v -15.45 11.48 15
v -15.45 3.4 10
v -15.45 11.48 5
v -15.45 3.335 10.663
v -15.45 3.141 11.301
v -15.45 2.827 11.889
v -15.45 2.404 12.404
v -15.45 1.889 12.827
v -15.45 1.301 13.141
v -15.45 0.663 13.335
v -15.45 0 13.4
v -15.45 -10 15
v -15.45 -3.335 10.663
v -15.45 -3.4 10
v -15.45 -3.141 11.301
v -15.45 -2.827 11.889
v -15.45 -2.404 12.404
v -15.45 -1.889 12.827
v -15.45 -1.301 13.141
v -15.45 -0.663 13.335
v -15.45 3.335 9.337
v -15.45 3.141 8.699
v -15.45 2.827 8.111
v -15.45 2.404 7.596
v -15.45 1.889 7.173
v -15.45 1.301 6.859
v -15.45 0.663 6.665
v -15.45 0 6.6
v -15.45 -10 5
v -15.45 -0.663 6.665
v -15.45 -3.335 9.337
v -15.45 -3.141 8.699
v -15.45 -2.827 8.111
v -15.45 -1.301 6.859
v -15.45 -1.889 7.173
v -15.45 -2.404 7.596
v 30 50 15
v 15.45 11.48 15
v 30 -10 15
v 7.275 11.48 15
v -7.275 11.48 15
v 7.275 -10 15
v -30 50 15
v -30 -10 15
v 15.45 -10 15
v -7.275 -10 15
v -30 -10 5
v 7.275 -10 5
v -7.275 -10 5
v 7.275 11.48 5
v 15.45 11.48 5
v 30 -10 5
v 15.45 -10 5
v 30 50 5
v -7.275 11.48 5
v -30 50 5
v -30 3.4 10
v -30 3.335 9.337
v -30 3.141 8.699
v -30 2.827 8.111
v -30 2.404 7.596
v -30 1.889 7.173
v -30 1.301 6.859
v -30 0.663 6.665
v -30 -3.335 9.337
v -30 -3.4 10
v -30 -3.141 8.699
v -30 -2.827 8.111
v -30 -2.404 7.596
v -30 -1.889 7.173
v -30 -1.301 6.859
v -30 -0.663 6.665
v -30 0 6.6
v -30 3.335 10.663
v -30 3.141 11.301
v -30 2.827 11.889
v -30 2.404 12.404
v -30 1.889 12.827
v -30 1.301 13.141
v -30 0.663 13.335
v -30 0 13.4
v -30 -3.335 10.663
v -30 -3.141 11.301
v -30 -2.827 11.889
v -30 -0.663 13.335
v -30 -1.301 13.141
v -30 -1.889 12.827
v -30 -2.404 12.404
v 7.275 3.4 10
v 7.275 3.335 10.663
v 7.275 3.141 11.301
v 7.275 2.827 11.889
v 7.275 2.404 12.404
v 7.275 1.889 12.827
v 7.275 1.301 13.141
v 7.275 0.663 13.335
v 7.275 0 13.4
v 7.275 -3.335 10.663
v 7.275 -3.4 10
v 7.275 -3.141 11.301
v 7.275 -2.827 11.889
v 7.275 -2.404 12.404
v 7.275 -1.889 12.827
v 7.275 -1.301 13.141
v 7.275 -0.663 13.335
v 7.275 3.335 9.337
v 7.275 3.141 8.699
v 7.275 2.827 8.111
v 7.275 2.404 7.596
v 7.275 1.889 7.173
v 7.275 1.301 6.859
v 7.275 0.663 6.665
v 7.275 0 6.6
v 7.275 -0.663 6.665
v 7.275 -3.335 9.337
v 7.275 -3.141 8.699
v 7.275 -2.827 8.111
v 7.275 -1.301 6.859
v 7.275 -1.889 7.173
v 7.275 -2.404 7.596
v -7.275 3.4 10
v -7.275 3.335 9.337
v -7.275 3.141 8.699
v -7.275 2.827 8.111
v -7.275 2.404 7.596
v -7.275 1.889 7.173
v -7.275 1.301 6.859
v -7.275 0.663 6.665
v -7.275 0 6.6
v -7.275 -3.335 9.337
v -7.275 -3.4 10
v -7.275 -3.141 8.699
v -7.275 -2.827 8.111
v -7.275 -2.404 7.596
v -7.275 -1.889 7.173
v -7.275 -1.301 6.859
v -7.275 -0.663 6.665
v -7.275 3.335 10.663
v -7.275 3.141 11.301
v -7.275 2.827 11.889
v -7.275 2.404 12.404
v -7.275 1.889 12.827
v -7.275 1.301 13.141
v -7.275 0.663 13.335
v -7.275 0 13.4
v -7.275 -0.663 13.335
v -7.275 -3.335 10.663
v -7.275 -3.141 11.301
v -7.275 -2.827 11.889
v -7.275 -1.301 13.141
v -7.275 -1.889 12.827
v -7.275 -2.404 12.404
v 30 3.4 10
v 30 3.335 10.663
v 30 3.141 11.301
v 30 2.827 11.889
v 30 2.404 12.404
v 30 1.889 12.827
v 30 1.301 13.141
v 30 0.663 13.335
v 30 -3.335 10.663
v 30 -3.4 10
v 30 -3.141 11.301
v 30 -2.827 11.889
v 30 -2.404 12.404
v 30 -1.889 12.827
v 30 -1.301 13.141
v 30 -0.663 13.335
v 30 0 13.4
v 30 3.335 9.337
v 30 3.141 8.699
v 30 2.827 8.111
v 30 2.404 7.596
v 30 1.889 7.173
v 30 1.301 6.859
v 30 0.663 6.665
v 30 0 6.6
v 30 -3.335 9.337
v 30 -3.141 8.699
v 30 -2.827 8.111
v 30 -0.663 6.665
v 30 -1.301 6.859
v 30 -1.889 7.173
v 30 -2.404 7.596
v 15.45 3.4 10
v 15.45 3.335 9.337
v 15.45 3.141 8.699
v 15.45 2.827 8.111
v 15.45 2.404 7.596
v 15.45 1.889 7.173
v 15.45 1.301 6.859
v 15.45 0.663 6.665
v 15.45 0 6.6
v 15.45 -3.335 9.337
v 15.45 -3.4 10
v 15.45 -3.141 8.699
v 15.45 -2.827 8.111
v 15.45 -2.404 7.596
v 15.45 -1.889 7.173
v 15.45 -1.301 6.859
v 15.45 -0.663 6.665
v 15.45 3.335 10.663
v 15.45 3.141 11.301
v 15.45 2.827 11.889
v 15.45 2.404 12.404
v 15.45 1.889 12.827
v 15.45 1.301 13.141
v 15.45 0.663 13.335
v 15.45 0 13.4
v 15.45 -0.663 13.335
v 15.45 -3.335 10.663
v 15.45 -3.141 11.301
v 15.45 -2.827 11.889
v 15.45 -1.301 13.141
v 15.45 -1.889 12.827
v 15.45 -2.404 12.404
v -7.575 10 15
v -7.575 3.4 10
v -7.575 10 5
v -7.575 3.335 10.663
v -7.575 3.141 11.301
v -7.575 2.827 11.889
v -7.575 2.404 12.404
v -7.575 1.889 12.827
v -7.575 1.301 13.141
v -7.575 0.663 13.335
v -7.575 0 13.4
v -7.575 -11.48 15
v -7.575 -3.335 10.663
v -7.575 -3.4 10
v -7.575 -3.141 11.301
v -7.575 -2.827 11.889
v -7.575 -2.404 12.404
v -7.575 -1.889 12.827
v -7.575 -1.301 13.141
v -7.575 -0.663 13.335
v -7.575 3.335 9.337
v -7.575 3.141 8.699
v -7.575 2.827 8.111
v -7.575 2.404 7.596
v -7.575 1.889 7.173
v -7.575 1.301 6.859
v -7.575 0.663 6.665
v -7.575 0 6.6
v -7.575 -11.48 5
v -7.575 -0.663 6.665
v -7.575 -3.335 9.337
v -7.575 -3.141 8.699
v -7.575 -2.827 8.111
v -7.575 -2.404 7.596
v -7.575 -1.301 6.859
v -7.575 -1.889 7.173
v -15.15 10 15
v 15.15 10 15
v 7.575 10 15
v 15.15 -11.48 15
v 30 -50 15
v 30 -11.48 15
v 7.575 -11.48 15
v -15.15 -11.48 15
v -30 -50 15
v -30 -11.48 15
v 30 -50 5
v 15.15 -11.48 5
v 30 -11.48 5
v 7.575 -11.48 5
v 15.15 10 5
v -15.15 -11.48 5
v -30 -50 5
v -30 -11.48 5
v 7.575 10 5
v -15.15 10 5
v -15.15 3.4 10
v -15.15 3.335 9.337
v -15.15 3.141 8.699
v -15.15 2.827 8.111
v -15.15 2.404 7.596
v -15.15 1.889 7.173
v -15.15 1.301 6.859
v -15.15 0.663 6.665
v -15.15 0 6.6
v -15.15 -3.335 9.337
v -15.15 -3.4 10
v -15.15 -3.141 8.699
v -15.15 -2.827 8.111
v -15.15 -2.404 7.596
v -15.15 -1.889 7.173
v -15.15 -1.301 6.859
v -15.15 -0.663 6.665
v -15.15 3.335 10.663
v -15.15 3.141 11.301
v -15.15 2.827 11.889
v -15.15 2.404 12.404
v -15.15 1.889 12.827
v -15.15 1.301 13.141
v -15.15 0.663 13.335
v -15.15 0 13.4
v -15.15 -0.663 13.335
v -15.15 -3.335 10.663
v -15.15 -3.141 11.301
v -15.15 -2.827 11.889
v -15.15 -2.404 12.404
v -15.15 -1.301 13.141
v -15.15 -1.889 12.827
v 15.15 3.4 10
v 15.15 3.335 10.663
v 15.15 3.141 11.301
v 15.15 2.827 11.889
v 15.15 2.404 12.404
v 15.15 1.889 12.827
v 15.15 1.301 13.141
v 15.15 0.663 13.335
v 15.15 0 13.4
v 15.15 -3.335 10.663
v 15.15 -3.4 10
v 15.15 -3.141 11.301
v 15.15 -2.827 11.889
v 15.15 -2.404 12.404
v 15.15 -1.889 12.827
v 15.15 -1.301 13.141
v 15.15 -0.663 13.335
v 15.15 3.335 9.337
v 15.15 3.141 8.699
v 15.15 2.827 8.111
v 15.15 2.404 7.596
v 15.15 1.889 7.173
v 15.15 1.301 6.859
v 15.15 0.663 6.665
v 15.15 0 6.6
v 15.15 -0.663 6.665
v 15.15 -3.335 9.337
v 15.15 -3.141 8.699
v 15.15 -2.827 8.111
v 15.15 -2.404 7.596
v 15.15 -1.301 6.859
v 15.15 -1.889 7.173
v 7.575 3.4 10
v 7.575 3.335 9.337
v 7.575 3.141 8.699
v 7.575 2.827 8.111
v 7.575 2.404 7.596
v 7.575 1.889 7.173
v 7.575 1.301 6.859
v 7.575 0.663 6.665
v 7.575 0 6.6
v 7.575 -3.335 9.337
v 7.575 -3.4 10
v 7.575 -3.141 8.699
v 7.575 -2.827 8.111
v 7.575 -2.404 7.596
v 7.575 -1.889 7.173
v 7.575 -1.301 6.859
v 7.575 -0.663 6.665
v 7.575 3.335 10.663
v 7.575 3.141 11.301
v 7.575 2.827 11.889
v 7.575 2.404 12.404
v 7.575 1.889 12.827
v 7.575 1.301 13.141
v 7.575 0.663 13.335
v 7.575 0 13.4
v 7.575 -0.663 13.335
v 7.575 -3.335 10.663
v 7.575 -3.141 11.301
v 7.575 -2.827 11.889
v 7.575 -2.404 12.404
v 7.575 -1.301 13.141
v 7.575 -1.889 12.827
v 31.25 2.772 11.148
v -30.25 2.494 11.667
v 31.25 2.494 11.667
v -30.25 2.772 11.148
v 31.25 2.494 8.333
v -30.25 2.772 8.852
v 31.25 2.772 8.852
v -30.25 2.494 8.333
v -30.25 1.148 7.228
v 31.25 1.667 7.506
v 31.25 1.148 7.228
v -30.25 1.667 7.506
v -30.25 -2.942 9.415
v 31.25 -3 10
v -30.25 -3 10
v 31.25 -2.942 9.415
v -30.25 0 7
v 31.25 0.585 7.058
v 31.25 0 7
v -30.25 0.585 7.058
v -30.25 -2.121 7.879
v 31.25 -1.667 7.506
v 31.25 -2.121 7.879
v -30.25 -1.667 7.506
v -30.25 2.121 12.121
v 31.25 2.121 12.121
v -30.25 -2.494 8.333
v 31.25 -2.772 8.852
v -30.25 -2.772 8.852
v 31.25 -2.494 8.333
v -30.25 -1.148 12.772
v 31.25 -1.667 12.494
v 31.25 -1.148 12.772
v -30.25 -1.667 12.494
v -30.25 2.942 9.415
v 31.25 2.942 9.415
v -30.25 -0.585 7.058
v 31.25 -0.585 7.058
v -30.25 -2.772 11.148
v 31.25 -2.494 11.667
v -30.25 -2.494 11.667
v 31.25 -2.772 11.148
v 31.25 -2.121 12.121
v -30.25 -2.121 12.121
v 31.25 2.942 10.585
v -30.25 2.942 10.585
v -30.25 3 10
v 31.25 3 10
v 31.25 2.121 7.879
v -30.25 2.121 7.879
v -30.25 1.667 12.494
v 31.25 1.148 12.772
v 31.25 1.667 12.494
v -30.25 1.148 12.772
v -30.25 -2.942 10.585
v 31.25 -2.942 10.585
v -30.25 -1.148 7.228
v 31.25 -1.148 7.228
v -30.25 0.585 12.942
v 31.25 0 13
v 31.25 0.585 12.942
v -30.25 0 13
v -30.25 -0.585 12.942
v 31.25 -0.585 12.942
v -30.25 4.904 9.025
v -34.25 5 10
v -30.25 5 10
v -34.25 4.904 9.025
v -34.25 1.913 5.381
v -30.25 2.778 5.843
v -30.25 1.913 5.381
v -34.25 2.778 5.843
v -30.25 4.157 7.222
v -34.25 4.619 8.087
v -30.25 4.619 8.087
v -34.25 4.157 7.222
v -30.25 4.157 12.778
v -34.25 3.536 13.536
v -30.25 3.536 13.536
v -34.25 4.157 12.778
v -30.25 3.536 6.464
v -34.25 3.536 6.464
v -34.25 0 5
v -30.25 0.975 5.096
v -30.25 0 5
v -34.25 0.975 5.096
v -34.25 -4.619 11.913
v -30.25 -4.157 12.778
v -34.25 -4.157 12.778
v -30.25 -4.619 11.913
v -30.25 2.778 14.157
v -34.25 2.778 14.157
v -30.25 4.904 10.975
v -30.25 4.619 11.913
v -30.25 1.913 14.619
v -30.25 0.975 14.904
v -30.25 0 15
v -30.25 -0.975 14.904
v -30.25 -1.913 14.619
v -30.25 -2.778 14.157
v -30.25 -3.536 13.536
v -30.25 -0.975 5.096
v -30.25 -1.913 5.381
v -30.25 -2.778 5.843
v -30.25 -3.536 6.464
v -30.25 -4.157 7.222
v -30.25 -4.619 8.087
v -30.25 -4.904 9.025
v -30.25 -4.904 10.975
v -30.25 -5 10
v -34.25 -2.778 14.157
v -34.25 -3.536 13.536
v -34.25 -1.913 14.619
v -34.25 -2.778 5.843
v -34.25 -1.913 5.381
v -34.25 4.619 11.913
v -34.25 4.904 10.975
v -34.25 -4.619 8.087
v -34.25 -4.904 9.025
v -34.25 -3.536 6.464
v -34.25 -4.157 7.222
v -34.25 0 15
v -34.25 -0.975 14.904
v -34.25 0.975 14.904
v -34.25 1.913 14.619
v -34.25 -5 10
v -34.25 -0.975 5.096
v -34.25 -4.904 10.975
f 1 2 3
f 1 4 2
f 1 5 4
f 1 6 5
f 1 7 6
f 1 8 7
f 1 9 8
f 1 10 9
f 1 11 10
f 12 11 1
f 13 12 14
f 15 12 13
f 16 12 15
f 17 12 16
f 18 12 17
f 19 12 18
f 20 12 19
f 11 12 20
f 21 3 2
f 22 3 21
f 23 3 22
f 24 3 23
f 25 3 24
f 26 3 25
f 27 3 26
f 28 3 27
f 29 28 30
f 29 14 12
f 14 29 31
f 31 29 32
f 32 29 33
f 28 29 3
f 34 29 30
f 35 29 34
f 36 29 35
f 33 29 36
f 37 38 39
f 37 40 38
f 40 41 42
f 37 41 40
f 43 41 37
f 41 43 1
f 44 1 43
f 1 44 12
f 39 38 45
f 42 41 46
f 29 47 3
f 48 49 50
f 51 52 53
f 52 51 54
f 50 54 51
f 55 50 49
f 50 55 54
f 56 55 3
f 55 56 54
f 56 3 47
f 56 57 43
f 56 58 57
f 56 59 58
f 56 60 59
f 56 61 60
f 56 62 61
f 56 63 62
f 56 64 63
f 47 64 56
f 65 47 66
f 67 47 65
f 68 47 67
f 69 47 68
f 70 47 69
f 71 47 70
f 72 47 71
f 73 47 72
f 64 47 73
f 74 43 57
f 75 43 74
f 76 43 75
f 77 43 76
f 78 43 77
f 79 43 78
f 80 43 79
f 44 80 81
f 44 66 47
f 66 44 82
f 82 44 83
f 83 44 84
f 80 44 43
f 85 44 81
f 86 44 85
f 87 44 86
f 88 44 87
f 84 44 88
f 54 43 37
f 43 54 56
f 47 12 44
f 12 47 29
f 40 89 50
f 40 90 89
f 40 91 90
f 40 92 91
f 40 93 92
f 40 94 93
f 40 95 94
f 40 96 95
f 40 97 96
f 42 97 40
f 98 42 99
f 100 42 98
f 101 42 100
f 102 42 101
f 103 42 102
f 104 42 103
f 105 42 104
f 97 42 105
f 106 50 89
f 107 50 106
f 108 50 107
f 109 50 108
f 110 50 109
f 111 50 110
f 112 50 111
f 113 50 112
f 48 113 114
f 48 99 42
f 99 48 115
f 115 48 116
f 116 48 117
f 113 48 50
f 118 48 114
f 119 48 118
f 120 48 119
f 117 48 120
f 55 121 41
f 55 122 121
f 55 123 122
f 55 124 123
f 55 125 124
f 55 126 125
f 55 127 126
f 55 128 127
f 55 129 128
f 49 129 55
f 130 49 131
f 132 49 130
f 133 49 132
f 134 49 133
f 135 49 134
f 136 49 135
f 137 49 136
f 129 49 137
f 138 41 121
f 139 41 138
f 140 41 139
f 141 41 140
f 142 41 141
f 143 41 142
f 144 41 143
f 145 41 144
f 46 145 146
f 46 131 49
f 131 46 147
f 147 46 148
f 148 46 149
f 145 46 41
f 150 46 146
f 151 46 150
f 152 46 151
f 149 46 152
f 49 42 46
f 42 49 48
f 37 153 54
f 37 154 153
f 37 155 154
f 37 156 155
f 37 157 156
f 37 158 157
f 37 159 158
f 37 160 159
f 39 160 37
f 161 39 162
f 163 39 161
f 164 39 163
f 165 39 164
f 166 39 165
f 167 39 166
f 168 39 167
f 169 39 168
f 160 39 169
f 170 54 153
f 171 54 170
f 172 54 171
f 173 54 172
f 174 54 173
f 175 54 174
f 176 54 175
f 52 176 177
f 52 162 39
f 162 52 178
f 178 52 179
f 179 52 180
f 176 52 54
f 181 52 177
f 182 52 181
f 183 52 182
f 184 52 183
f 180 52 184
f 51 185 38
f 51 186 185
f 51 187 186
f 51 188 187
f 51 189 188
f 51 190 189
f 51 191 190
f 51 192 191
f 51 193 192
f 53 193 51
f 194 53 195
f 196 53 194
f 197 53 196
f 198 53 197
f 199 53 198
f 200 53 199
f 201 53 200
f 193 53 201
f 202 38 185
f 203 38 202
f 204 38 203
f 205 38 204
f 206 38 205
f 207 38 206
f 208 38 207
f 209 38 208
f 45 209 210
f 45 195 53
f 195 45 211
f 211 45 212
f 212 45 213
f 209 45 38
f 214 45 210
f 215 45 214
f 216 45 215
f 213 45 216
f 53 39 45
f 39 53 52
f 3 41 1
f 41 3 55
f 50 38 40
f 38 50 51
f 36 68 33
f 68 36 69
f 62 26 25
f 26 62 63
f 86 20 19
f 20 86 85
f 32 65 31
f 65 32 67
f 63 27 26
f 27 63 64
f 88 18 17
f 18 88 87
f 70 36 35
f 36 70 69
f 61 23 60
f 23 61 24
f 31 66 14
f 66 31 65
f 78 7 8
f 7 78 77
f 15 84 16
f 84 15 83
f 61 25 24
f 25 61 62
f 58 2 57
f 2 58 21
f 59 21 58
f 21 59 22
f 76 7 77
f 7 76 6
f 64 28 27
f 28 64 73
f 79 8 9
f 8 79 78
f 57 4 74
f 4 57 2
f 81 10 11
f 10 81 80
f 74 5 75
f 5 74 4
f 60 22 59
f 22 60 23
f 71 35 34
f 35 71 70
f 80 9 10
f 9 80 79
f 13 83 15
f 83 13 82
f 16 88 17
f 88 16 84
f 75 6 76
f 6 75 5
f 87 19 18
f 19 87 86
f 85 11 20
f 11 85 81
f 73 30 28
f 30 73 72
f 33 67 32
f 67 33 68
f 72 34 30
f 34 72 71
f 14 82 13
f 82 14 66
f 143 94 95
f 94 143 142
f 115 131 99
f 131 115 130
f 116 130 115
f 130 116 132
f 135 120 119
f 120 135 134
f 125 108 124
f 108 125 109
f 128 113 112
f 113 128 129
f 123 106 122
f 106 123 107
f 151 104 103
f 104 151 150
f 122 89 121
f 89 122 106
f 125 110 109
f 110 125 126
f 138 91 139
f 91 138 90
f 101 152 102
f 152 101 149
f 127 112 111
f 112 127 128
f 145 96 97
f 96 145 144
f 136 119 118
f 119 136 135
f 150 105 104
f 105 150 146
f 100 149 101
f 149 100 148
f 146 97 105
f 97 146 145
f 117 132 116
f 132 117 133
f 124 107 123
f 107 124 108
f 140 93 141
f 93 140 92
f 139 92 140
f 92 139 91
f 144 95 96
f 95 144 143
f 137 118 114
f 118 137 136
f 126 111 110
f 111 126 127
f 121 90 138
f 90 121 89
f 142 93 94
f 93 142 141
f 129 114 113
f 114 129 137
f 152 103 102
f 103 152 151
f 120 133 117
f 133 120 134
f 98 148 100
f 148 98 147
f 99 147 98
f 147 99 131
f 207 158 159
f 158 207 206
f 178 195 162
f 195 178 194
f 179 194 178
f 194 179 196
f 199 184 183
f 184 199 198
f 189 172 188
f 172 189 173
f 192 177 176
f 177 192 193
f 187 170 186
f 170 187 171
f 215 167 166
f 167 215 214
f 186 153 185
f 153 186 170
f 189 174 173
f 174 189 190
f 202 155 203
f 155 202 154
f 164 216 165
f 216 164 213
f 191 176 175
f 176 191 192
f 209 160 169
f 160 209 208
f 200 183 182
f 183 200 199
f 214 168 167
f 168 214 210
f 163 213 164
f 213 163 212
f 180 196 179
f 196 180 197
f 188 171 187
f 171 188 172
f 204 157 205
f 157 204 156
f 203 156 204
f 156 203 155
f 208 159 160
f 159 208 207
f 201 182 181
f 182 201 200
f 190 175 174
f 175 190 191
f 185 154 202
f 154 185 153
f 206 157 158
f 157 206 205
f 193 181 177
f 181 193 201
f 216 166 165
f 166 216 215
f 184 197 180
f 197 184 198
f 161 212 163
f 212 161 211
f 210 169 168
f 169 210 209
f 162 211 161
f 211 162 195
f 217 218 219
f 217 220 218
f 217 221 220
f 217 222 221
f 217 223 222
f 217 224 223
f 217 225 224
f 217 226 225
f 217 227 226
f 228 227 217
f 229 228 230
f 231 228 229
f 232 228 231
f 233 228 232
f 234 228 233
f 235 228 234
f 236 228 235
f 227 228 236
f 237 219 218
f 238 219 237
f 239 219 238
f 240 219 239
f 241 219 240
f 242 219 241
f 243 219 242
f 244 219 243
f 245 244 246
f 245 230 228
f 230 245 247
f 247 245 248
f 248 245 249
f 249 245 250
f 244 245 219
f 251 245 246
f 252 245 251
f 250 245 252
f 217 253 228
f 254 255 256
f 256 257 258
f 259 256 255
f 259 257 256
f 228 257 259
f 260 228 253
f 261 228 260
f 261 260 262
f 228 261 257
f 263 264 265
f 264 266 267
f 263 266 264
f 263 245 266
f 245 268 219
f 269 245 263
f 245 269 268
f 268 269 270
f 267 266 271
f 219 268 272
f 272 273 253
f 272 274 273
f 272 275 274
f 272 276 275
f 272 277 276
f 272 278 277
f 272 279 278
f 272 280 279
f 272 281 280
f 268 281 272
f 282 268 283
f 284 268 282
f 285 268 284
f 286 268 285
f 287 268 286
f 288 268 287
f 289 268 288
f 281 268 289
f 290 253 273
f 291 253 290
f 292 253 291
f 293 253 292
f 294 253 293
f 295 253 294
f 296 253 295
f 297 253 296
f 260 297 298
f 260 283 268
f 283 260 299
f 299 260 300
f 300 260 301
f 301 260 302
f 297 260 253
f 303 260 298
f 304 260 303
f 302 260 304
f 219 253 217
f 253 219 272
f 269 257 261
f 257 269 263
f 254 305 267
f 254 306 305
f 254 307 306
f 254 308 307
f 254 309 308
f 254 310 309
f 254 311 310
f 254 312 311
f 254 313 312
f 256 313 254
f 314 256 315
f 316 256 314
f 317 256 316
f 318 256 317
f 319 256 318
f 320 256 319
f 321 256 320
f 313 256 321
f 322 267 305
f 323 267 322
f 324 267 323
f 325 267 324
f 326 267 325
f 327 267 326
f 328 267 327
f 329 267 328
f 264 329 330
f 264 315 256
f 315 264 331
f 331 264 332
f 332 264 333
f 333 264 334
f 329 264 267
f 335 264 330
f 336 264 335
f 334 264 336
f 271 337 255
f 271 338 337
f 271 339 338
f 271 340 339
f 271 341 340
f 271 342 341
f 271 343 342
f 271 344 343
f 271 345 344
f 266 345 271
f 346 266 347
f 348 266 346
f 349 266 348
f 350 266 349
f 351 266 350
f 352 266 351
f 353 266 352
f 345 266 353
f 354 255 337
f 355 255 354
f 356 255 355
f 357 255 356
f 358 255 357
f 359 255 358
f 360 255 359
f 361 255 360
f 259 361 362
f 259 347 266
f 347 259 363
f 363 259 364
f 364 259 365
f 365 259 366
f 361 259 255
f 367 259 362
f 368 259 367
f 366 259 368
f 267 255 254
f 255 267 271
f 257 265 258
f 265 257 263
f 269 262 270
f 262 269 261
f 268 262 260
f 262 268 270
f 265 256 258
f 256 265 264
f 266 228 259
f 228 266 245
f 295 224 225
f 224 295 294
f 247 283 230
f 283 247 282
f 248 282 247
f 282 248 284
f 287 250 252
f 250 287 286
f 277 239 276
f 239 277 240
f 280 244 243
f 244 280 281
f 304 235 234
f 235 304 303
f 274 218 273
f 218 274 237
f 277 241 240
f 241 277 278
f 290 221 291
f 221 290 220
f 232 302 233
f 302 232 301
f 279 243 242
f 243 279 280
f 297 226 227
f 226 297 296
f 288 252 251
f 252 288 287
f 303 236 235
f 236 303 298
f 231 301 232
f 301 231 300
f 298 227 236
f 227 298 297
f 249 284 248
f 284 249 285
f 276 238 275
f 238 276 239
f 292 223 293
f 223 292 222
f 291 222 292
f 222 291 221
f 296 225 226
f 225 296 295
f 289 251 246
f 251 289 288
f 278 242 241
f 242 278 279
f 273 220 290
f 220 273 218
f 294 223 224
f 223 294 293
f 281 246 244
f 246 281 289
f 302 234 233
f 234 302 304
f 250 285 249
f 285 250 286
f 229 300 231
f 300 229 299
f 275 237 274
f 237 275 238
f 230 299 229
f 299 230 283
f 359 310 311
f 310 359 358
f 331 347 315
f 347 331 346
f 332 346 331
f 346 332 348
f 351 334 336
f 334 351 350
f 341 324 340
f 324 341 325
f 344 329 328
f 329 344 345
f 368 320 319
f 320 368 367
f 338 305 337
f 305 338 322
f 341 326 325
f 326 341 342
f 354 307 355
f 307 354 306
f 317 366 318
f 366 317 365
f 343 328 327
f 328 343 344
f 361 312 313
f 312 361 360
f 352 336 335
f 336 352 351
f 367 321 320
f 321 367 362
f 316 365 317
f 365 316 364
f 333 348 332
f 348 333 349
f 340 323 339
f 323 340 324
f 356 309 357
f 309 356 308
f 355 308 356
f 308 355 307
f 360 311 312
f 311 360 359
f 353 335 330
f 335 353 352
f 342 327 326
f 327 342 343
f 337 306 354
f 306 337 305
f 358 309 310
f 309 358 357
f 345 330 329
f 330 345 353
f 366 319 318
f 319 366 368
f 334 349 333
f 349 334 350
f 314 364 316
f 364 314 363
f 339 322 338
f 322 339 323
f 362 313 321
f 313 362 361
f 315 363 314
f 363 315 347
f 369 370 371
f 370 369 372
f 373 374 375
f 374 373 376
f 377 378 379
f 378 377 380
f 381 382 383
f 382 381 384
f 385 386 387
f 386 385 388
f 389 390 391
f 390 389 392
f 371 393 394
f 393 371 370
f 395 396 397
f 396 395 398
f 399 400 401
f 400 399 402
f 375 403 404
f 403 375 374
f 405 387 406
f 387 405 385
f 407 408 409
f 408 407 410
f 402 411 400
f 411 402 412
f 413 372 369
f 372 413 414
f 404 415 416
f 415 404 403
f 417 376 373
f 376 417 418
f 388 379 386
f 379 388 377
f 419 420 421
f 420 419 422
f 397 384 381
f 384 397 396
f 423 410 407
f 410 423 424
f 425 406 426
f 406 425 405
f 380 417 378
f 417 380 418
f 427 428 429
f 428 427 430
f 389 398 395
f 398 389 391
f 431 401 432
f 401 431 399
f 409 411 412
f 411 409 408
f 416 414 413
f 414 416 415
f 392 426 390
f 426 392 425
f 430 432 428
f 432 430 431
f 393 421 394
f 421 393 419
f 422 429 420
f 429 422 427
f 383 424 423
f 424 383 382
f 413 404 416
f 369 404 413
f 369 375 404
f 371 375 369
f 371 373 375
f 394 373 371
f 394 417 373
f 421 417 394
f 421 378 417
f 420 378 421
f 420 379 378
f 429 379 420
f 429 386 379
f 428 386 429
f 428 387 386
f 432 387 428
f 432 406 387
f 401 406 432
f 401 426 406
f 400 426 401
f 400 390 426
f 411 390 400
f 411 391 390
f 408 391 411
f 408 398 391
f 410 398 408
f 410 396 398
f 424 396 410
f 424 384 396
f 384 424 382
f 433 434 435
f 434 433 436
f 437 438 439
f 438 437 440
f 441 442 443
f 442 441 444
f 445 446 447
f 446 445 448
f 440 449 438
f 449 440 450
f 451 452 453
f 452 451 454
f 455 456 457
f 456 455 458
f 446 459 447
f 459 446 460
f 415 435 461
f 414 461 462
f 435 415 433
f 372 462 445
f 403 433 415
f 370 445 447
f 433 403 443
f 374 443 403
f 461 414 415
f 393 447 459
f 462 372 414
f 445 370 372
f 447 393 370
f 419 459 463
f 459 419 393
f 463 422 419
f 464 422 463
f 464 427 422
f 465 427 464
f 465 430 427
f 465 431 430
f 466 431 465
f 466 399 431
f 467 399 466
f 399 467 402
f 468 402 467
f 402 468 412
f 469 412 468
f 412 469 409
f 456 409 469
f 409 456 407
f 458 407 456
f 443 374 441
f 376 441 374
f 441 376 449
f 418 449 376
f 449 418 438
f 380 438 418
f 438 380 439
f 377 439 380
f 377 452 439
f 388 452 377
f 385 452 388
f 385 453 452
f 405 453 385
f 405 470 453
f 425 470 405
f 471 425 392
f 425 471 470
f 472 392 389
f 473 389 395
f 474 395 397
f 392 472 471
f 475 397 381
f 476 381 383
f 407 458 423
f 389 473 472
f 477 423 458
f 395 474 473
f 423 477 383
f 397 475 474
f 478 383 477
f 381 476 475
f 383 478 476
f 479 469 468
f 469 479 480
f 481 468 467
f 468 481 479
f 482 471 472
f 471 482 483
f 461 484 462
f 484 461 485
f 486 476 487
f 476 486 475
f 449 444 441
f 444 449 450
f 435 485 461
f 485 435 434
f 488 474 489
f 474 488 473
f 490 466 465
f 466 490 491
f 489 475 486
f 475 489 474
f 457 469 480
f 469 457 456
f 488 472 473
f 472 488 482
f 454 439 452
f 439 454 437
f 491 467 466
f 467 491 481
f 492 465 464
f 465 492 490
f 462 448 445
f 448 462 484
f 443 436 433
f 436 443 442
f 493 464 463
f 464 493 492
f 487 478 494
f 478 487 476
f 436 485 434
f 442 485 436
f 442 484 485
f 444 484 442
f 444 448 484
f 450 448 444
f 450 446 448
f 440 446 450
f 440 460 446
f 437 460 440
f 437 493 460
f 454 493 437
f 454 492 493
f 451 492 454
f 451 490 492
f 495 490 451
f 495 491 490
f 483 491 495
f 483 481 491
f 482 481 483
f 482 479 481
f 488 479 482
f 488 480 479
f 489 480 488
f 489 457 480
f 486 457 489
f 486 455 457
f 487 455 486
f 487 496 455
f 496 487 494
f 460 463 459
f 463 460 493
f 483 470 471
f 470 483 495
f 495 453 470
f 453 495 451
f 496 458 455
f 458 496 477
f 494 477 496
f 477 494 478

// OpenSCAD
$fn = 32;

// ------------------------------------------------------------------------
// Butt hinge: hinge 60 mm, leaf swung 0 deg
// Every part is its own module, assembly() places every instance.
// ------------------------------------------------------------------------

// --- part 1 ---
module hinge_base() {
  difference() {
    union() {
      translate([-30, -10, -5]) cube([14.55, 60, 10]);
      translate([-7.275, -10, -5]) cube([14.55, 60, 10]);
      translate([15.45, -10, -5]) cube([14.55, 60, 10]);
      translate([-30, 11.48, -5]) cube([60, 38.52, 10]);
    }
    translate([-22.725, 0, 0]) rotate([0, 90, 0]) cylinder(h = 16.55, d = 6.8, center = true);
    translate([0, 0, 0]) rotate([0, 90, 0]) cylinder(h = 16.55, d = 6.8, center = true);
    translate([22.725, 0, 0]) rotate([0, 90, 0]) cylinder(h = 16.55, d = 6.8, center = true);
  }
}

// --- part 2 ---
module hinge_mover() {
  difference() {
    union() {
      translate([-15.15, -50, -5]) cube([7.575, 60, 10]);
      translate([7.575, -50, -5]) cube([7.575, 60, 10]);
      translate([-30, -50, -5]) cube([60, 38.52, 10]);
    }
    translate([-11.362, 0, 0]) rotate([0, 90, 0]) cylinder(h = 9.575, d = 6.8, center = true);
    translate([11.362, 0, 0]) rotate([0, 90, 0]) cylinder(h = 9.575, d = 6.8, center = true);
  }
}

// --- part 3 ---
module hinge_pin() {
  rotate([0, 90, 0]) cylinder(h = 62.5, d = 6, center = true);
  translate([-34.25, 0, 0]) rotate([0, 90, 0]) cylinder(h = 4, d = 10);
}

// --- assembly ---
module assembly() {
  color([0.80, 0.24, 0.20]) translate([0, 0, 10]) rotate([0, 0, 0]) hinge_base();
  color([0.20, 0.45, 0.75]) translate([0, 0, 10]) rotate([0, 0, 0]) hinge_mover();
  color([0.25, 0.62, 0.32]) translate([0, 0, 10]) rotate([0, 0, 0]) hinge_pin();
}

assembly();
